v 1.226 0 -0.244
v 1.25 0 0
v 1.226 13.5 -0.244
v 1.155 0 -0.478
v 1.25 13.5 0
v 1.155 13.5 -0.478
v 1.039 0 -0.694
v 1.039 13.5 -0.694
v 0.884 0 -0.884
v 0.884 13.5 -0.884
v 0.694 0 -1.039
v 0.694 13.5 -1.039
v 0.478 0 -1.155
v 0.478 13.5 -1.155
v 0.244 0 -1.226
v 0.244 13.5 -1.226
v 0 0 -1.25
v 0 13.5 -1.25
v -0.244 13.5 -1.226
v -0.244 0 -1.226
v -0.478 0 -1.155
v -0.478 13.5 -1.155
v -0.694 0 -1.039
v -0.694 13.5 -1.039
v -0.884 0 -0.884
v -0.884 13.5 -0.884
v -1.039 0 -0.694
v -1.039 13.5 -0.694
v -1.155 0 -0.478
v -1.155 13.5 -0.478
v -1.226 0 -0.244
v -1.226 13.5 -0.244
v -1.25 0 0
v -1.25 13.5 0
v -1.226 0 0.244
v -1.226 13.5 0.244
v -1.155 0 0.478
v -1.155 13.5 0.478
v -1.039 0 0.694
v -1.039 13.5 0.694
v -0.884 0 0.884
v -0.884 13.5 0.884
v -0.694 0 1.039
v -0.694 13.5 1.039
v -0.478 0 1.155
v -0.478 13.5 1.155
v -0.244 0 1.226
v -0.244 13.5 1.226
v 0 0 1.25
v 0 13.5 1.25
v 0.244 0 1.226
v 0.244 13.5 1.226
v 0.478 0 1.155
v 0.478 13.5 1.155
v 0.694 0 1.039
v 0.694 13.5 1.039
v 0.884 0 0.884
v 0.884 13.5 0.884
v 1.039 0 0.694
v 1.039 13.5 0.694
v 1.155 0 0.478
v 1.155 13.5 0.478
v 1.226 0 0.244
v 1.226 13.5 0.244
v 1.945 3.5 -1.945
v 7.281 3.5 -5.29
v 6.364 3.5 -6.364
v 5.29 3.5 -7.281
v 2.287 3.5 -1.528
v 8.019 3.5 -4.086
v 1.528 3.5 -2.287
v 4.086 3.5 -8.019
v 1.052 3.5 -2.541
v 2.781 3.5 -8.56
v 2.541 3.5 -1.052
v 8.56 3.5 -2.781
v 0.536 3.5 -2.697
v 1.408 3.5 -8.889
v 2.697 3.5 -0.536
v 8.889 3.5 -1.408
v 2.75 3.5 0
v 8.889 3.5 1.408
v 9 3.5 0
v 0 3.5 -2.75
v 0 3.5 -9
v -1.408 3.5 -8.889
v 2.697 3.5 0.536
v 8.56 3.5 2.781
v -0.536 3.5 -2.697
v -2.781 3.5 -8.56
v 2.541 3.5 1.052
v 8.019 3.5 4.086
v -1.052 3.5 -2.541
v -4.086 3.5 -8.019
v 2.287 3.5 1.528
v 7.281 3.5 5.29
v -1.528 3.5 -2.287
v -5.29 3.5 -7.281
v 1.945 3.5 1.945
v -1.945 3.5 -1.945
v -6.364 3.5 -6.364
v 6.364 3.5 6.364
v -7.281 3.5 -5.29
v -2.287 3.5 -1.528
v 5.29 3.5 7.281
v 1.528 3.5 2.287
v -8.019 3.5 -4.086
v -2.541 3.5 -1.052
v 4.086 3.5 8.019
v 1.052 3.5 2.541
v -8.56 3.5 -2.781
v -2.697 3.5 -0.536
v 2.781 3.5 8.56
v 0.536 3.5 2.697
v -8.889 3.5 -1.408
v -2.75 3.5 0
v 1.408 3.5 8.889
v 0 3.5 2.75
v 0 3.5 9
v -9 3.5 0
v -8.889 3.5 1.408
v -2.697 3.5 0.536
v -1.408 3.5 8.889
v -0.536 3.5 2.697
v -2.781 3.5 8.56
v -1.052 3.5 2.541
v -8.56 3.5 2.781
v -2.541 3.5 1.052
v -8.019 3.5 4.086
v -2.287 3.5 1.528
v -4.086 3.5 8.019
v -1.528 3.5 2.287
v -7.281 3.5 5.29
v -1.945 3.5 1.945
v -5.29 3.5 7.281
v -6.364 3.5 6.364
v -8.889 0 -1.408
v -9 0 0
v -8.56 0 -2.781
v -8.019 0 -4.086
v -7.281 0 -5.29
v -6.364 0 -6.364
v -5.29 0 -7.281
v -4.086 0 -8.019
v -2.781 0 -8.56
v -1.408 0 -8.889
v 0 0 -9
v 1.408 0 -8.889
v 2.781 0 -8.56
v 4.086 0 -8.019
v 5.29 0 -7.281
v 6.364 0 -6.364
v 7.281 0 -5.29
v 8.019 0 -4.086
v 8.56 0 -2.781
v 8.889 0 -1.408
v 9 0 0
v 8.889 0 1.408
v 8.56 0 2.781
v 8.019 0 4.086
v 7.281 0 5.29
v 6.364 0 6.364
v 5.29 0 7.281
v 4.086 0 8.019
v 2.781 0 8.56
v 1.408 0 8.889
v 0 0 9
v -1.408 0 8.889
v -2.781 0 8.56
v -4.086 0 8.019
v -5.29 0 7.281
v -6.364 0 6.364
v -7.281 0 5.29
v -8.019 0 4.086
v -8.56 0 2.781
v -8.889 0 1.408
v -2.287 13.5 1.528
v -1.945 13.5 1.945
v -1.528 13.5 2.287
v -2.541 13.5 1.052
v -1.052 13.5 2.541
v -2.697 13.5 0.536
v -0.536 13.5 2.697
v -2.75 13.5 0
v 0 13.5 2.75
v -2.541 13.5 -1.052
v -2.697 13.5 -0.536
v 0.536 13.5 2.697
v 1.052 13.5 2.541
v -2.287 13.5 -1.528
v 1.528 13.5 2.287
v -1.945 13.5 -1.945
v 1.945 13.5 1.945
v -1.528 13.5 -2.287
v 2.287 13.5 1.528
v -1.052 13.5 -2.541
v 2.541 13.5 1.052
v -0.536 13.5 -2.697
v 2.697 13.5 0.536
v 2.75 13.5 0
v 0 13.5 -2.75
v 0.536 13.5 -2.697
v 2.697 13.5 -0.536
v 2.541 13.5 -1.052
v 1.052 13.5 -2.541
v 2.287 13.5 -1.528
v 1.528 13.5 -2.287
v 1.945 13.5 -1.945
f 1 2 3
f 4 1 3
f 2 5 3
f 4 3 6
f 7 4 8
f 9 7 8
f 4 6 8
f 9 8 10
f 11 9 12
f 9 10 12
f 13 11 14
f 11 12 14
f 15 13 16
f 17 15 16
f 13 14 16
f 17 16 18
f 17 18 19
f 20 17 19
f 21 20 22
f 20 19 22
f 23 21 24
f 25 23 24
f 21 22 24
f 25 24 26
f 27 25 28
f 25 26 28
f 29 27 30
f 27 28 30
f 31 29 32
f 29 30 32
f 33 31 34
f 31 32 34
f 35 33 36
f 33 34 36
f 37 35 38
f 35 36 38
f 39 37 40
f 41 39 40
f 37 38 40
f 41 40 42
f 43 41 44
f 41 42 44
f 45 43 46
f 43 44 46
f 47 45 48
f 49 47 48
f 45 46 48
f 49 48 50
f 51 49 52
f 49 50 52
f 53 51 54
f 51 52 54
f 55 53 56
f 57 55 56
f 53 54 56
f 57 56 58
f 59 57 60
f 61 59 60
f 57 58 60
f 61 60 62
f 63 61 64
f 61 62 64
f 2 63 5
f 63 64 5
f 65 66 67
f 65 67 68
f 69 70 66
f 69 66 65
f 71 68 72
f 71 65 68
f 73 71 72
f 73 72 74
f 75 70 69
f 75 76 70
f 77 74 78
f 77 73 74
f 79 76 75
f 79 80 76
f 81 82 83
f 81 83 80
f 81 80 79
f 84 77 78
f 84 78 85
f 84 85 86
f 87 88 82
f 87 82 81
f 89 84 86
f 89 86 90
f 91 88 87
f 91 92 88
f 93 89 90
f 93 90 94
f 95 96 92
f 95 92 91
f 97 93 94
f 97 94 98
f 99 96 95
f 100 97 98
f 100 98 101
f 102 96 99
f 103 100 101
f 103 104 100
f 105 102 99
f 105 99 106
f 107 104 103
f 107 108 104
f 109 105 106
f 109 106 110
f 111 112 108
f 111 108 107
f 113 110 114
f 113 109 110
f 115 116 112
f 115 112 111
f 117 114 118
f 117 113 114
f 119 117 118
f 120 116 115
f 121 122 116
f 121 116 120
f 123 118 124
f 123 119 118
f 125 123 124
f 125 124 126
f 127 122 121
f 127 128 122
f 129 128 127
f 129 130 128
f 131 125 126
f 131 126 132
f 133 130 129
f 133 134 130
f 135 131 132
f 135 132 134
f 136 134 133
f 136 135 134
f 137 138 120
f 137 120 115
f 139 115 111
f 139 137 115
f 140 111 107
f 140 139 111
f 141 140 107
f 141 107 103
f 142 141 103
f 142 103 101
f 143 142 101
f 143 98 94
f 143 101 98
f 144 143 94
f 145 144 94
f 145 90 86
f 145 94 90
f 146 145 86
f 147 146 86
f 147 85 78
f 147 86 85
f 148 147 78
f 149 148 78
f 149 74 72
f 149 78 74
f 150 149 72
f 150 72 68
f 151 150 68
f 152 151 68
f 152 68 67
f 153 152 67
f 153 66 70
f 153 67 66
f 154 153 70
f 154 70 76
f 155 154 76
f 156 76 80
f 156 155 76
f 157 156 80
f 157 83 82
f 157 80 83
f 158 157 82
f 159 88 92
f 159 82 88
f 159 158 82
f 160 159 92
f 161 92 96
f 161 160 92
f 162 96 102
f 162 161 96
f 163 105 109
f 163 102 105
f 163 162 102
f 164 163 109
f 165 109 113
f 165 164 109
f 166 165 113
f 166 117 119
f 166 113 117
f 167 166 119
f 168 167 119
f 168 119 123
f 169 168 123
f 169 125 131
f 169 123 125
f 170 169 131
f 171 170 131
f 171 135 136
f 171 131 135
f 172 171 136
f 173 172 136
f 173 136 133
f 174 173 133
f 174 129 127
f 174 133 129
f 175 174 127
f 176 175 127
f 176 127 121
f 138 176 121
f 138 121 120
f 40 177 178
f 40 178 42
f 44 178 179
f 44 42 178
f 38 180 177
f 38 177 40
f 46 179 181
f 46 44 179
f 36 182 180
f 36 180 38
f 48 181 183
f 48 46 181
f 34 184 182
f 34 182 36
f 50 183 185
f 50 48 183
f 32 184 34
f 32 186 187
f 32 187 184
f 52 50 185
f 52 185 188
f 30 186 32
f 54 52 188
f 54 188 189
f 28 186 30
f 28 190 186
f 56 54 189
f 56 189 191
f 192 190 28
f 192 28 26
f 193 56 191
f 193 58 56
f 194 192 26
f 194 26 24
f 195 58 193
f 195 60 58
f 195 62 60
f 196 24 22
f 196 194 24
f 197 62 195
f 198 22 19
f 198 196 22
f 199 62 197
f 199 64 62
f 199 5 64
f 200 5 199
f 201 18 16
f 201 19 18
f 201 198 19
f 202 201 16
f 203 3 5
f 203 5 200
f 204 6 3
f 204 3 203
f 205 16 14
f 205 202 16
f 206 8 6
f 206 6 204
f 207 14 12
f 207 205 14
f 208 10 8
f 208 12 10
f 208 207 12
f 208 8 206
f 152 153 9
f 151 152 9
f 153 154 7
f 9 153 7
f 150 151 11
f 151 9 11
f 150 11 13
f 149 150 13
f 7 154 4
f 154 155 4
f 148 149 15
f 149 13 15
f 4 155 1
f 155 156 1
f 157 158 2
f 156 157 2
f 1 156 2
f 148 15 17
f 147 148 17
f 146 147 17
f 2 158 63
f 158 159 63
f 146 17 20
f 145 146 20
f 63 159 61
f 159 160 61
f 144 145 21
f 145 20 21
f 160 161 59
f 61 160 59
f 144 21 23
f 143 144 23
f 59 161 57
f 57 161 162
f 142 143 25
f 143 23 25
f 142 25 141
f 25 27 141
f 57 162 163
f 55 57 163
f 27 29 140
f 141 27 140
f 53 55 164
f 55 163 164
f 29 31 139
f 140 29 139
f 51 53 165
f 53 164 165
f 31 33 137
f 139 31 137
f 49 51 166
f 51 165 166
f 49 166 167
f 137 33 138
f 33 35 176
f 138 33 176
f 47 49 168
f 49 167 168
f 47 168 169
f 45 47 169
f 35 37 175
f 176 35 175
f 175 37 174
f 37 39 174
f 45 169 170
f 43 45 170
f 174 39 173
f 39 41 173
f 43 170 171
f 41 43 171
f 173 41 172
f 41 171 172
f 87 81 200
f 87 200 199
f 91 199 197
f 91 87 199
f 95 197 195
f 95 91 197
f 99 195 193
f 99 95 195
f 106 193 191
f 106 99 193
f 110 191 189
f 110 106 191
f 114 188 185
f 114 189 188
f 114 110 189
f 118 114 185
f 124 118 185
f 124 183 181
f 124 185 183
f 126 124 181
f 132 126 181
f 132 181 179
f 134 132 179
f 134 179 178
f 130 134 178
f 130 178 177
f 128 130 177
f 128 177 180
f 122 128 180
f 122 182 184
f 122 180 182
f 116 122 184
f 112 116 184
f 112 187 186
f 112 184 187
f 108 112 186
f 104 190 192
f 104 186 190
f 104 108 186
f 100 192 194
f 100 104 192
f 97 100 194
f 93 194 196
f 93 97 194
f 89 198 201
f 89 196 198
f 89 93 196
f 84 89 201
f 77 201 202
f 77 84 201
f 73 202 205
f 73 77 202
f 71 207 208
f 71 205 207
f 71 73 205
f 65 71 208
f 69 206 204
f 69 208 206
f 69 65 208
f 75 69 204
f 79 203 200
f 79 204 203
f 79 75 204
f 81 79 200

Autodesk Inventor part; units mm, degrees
ref_plane "YZ Plane" through (0, 0, 0) normal (1, 0, 0) x (0, 1, 0)
ref_plane "XZ Plane" through (0, 0, 0) normal (0, 1, 0) x (-1, 0, 0)
ref_plane "XY Plane" through (0, 0, 0) normal (0, 0, 1) x (1, 0, 0)
sketch "Sketch1" plane through (0, 0, 0) normal (0, 1, 0) x (-1, 0, 0)
  circle A0 centre (0, 0) radius 9
  dimension "d0" = 18
extrude "Extrusion1" add sketch "Sketch1" along normal blind 3.5
sketch "Sketch2" plane through (0, 3.5, 0) normal (0, 1, 0) x (1, 0, 0)
  circle A0 centre (0, 0) radius 2.75
  dimension "d3" = 5.5
extrude "Extrusion2" add sketch "Sketch2" along normal blind 10
sketch "Sketch3" plane through (0, 13.5, 0) normal (0, 1, 0) x (1, 0, 0)
  circle A0 centre (0, 0) radius 1.25
  dimension "d6" = 2.5
extrude "Extrusion3" cut sketch "Sketch3" against normal up to surface (13.5 mm away)
properties part number "Belt_Bearing_Holder"
